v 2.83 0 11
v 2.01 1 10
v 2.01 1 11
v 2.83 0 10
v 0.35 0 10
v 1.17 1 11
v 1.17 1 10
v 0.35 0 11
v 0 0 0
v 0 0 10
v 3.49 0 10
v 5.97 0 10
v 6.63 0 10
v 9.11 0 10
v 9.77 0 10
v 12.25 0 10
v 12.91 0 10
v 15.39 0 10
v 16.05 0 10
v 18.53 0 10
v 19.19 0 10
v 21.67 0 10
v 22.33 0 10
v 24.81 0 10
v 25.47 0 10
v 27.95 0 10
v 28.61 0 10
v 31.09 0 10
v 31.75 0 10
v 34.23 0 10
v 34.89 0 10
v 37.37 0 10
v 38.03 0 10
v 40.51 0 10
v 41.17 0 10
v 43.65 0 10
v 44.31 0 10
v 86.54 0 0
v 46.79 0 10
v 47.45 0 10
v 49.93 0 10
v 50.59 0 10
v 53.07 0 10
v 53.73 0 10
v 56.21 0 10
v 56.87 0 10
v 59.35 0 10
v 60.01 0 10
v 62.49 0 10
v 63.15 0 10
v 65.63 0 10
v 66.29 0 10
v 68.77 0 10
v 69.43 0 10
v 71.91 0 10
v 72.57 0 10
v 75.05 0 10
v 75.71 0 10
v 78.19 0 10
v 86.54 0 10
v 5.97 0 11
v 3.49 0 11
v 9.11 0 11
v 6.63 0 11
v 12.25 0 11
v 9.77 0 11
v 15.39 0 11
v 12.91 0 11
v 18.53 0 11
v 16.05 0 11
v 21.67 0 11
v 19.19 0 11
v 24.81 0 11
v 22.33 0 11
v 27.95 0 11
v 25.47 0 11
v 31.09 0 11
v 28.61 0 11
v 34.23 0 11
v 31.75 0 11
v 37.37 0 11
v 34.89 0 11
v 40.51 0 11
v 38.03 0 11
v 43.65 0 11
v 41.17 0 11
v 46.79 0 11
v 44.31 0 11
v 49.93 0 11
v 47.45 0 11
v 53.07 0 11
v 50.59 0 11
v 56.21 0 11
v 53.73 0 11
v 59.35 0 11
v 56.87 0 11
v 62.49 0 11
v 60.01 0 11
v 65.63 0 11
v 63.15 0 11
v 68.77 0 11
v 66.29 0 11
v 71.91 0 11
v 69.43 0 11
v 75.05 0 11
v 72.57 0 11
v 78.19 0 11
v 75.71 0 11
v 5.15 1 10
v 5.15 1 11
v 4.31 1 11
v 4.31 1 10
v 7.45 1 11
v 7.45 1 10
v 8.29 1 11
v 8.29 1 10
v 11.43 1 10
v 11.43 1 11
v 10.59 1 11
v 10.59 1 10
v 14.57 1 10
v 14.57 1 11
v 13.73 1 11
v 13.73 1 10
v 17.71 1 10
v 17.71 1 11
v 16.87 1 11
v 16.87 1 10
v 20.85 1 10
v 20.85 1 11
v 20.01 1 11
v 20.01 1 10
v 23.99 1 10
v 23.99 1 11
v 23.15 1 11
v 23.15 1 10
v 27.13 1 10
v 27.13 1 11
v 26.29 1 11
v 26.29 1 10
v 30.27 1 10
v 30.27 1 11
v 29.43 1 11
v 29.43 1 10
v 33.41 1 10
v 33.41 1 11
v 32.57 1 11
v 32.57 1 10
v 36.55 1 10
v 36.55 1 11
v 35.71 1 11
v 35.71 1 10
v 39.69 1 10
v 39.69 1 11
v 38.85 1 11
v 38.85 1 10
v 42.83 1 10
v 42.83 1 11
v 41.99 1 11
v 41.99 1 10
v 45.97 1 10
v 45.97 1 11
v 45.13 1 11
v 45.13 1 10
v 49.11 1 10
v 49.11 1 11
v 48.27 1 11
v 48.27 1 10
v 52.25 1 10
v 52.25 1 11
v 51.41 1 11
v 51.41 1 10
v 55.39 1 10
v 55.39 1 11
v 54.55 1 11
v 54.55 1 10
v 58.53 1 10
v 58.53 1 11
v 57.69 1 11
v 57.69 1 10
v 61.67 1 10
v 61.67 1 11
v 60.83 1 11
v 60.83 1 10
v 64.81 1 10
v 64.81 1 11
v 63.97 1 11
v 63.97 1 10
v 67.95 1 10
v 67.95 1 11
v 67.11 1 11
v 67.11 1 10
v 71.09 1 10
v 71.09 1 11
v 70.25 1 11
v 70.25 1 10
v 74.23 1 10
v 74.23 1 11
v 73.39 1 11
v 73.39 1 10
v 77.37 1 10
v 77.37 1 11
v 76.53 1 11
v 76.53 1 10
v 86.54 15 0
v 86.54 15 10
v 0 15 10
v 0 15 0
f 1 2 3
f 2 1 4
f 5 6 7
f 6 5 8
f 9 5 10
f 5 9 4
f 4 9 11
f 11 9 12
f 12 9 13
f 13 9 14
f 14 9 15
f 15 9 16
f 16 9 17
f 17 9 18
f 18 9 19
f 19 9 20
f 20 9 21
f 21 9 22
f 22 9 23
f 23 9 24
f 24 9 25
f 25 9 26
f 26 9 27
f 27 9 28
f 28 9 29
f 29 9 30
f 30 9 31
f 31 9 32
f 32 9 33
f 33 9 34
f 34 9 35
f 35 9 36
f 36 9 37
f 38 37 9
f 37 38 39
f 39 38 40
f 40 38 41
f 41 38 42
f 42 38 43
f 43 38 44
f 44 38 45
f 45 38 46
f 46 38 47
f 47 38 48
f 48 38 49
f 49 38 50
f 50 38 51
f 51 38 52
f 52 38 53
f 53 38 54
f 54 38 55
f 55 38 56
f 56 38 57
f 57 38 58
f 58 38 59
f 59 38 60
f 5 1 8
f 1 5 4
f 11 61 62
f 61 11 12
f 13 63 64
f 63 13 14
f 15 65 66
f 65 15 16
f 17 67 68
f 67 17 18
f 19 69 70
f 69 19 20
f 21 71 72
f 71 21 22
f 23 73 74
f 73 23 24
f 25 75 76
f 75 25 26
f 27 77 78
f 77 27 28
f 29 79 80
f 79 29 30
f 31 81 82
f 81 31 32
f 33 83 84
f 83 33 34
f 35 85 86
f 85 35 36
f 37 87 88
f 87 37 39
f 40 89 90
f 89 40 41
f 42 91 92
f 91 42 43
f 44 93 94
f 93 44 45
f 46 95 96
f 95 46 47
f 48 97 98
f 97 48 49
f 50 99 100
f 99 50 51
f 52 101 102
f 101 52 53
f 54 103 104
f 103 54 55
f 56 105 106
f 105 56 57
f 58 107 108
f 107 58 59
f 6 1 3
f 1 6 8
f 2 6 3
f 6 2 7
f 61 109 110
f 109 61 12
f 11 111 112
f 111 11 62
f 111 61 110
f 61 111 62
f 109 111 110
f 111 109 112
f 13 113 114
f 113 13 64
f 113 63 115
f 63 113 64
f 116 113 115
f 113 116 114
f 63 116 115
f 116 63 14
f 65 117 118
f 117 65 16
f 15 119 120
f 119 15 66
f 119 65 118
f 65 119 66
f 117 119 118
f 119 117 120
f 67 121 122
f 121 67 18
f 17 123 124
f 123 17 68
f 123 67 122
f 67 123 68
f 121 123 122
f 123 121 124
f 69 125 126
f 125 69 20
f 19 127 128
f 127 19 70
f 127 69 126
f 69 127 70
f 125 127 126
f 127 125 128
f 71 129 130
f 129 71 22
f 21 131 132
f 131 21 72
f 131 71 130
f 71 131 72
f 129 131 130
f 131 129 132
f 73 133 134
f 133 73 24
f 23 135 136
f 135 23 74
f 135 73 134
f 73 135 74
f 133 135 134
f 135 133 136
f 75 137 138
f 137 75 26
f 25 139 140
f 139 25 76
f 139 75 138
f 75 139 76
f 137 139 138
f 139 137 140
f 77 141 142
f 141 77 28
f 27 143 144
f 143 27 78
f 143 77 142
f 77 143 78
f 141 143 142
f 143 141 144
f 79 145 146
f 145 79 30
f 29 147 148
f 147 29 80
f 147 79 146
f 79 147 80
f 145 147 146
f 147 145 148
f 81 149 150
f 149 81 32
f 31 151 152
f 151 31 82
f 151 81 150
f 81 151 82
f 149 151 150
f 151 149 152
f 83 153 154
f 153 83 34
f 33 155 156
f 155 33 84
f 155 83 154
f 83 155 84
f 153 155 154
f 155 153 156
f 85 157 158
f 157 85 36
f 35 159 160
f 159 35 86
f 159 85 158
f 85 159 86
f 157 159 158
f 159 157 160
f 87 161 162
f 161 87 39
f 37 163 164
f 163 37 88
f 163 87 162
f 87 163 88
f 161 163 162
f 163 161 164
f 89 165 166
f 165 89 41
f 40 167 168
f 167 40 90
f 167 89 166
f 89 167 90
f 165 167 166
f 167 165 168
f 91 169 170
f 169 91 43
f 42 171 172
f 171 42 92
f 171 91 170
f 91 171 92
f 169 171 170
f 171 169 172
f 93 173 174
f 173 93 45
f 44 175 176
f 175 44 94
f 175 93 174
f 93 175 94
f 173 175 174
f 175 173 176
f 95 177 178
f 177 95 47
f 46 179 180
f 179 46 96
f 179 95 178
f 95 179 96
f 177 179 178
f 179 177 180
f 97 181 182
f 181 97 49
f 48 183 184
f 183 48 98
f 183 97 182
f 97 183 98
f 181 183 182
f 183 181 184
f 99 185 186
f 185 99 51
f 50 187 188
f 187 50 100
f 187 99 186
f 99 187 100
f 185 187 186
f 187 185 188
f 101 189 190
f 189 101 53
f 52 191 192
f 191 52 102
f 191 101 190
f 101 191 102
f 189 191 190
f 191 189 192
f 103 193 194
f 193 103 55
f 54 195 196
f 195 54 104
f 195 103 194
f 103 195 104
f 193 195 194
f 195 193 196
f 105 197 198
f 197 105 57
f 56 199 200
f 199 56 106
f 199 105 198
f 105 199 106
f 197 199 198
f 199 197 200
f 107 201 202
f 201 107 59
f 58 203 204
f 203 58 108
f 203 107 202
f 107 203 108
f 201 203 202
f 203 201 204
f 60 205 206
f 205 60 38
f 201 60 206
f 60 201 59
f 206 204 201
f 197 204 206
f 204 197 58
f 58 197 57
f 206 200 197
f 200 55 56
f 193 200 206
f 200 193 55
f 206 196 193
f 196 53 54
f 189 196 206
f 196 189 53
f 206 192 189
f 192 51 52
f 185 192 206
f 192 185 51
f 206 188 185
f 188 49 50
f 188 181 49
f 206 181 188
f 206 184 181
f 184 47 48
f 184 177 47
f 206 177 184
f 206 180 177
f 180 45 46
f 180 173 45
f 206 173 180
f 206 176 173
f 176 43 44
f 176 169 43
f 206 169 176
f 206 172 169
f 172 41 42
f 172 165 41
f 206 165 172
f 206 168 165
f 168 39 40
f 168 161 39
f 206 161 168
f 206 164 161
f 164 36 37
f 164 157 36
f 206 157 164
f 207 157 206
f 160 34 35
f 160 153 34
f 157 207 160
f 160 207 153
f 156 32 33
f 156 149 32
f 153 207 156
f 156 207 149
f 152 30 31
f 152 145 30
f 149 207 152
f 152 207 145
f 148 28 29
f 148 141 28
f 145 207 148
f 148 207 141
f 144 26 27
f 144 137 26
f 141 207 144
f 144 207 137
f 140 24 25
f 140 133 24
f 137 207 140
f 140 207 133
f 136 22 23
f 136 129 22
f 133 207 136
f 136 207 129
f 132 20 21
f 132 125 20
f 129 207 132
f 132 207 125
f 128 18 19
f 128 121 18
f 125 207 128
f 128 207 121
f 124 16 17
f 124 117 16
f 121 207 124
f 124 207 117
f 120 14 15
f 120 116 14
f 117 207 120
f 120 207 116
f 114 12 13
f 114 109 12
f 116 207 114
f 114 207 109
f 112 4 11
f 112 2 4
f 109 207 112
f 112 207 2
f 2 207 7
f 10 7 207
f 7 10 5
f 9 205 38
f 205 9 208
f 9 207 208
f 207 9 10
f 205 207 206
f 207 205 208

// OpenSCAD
$fn = 32;

// ----------------------------------------------------------------------
// Gear rack: m=1 z=25, 86.54 x 15 x 11 mm
// ----------------------------------------------------------------------

// --- parameters (mm) ---
bar_len = 86.54;          // rack length, X
bar_w = 15;               // rack width, Y
bar_h = 11;               // overall height, Z
gear_module = 1;          // module
base_t = 10;              // tooth root line height
pitch = 3.14;             // circular pitch
tip_w = 0.84;             // tooth thickness at the tip
root_w = 2.48;            // tooth thickness at the root line
sink = 0.6;               // tooth root overlap into the body

tooth_span = 78.54;

module tooth(x0) {
  /* 20 deg flank profile, sunk into the body for a positive overlap */
  translate([x0, 0, base_t - sink])
    linear_extrude(height = bar_h - base_t + sink)
      polygon(points = [[-root_w / 2, 0], [root_w / 2, 0],
                        [tip_w / 2, bar_h - base_t],
                        [-tip_w / 2, bar_h - base_t]]);
}

difference() {
  union() {
    cube([bar_len, bar_w, base_t]);
    for (i = [0 : 25 - 1])
      tooth((i + 0.5) * pitch + (tooth_span - 25 * pitch) / 2);
  }
}
